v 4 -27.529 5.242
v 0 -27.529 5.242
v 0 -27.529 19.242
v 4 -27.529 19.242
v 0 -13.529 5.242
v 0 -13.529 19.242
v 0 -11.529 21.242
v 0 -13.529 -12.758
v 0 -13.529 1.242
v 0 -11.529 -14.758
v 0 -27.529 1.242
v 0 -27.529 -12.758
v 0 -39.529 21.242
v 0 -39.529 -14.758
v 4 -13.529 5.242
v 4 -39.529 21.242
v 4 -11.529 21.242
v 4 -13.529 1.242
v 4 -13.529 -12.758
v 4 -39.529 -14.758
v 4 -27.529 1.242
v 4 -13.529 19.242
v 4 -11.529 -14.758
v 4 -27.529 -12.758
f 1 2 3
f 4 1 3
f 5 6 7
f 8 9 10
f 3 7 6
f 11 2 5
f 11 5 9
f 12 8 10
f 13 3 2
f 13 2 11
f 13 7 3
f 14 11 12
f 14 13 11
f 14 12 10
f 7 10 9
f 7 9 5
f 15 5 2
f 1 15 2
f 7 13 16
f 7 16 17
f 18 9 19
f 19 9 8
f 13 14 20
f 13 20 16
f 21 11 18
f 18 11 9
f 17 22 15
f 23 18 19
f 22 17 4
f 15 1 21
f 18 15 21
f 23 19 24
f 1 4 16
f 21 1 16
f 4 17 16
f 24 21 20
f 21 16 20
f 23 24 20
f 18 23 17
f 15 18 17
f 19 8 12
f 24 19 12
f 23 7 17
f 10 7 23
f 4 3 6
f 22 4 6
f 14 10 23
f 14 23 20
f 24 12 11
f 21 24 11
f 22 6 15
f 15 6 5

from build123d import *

# Parameters (mm, degrees)
EXTRUDE_1_DEPTH = 4


with BuildPart() as part:
    # Sketch 1 → Бобышка-Вытянуть1 (new body)
    with BuildSketch(Plane(origin=(1e-09, -39.529244173, -14.757642275), x_dir=(9.977709055986143e-13, 0.6139406135149353, 0.7893522173763147), z_dir=(1.0, -1.5354534328683506e-11, 1.0678377959596007e-11))):
        Polygon((0, 0), (28.416679826, 22.101862087), (45.607017004, 0), (17.190337178, -22.101862087), align=None)
        Polygon((34.205262753, 11.401754251), (42.800431342, 0.350823208), (31.749500299, -8.244345381), (23.15433171, 2.806585662), align=None, mode=Mode.SUBTRACT)
        Polygon((8.945991797, -8.244345381), (19.99692284, 0.350823208), (28.592091429, -10.700107836), (17.541160386, -19.295276425), align=None, mode=Mode.SUBTRACT)
    extrude(amount=EXTRUDE_1_DEPTH)


solid = part.part
